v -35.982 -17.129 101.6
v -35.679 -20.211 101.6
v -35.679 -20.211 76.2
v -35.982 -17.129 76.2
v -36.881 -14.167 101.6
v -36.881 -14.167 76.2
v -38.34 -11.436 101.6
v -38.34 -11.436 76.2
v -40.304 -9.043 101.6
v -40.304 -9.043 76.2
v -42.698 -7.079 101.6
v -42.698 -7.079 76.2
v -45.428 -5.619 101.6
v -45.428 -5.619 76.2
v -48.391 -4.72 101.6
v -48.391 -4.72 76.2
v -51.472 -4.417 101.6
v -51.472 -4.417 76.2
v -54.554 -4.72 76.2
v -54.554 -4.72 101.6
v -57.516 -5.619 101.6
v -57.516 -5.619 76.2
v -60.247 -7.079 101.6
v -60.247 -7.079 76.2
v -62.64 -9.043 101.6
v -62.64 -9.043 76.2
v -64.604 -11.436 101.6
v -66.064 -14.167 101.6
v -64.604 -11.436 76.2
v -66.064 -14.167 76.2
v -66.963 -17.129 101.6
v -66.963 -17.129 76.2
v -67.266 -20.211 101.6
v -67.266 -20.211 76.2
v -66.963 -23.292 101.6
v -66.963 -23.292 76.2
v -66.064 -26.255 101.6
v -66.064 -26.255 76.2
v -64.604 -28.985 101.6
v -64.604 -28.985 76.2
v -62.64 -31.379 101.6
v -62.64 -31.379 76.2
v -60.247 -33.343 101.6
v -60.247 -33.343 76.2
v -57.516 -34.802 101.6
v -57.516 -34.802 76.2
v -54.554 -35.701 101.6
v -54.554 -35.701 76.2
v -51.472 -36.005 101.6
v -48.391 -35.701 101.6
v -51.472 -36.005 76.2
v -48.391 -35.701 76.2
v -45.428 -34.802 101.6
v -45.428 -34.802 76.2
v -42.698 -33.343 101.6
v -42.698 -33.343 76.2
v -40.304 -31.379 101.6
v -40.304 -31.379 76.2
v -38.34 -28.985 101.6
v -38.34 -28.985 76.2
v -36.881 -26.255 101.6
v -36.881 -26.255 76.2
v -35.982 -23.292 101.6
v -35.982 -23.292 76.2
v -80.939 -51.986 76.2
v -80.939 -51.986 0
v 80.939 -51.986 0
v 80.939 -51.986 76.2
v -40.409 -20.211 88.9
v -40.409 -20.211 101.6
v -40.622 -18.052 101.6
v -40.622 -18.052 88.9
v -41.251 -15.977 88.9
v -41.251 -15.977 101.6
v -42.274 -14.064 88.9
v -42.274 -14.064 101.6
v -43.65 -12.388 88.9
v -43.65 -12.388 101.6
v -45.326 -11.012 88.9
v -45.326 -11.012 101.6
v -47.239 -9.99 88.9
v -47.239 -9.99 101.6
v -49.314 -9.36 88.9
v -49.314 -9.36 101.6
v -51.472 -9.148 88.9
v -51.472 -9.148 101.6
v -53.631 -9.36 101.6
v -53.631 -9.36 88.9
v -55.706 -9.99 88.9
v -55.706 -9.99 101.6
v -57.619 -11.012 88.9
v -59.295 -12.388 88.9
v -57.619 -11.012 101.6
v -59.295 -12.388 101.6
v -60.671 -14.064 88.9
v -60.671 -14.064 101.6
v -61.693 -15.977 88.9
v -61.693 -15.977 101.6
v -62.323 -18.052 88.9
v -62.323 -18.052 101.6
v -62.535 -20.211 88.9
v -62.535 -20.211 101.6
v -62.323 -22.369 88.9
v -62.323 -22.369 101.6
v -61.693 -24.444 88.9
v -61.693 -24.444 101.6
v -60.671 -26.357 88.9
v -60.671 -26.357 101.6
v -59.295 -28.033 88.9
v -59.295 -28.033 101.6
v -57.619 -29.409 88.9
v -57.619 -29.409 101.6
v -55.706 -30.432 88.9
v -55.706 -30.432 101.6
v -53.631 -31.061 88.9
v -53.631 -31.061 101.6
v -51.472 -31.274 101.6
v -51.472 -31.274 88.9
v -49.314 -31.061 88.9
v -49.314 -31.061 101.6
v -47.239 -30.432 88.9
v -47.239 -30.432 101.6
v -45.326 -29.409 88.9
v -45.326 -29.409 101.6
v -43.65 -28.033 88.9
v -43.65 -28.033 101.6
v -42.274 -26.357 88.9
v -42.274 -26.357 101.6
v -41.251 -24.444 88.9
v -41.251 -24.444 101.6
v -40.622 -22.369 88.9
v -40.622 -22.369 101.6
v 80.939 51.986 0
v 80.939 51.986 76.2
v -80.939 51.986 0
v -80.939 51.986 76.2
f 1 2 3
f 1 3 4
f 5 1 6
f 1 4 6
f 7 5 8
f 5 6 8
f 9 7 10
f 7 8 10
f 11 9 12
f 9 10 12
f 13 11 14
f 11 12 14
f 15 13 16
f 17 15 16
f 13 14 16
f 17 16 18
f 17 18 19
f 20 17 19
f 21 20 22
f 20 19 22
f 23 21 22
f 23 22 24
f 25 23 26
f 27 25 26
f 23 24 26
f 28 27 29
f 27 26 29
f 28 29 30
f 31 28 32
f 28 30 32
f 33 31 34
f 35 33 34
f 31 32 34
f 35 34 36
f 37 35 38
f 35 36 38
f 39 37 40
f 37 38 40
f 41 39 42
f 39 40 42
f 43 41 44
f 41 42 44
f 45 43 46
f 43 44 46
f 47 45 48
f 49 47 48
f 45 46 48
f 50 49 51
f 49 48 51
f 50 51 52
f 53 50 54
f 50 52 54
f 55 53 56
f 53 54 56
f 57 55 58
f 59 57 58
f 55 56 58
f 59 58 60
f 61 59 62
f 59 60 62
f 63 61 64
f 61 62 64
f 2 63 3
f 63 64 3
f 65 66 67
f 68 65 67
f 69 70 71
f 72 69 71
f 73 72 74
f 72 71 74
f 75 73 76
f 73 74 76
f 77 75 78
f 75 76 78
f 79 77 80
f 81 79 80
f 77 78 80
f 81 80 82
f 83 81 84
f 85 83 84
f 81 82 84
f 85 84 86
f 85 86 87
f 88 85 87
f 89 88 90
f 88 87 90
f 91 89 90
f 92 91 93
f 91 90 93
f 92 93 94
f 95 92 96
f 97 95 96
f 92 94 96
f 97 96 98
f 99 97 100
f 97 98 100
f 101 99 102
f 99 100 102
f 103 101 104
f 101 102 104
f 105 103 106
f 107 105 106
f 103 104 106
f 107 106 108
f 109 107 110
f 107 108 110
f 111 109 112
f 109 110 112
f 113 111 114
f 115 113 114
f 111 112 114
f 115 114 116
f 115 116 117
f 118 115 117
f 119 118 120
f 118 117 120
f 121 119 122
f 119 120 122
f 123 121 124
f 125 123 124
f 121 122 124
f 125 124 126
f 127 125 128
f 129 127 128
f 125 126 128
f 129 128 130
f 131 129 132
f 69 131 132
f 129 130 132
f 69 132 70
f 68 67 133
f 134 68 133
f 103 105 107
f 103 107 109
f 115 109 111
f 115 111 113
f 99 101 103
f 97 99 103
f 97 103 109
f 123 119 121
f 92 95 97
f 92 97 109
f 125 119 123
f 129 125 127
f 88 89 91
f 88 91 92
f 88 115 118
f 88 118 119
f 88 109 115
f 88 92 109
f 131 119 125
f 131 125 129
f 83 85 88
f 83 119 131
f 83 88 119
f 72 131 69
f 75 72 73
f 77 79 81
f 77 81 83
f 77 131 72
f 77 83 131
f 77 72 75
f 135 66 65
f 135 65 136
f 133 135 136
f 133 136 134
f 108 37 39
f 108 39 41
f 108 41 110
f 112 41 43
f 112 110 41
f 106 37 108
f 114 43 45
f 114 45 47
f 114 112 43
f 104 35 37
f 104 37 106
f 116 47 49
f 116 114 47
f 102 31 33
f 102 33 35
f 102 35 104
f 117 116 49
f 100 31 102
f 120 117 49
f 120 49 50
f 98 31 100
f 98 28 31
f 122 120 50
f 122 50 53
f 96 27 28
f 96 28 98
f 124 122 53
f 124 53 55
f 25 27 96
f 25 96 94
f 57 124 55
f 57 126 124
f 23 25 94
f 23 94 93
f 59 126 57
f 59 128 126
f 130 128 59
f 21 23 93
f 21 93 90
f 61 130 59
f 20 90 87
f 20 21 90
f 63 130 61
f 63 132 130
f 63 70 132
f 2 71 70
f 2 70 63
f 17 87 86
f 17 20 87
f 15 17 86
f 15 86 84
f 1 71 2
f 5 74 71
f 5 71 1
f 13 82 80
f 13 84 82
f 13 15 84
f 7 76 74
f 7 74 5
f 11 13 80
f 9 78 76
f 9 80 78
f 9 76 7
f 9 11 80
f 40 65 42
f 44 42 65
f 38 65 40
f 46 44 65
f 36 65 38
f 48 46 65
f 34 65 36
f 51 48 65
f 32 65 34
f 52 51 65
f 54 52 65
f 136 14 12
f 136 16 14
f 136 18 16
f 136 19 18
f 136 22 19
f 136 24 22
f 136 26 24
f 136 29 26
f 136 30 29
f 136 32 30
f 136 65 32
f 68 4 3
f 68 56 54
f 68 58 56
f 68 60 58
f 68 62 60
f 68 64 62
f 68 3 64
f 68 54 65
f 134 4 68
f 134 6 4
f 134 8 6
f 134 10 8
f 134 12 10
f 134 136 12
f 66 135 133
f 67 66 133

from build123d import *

# Parameters (mm, degrees)
F0_W     = 161.877722
F0_H     = 103.971594
F1_DEPTH = 76.2
F2_R     = 15.793855
F3_DEPTH = 25.4
F4_R     = 11.063024
F5_DEPTH = 12.7


with BuildPart() as f1:
    # F0 (on Top) → F1 (new body)
    with BuildSketch(Plane.XY):
        Rectangle(F0_W, F0_H)
    extrude(amount=F1_DEPTH)

    # F2 (on face) → F3 (join)
    with BuildSketch(Plane.XY.offset(76.2)):
        with Locations((-51.472373, -20.210665)):
            Circle(F2_R)
    extrude(amount=F3_DEPTH)

    # F4 (on face) → F5 (cut, symmetric)
    with BuildSketch(Plane.XY.offset(101.6)):
        with Locations((-51.472373, -20.210665)):
            Circle(F4_R)
    extrude(amount=-F5_DEPTH, both=True, mode=Mode.SUBTRACT)


solid = f1.part
